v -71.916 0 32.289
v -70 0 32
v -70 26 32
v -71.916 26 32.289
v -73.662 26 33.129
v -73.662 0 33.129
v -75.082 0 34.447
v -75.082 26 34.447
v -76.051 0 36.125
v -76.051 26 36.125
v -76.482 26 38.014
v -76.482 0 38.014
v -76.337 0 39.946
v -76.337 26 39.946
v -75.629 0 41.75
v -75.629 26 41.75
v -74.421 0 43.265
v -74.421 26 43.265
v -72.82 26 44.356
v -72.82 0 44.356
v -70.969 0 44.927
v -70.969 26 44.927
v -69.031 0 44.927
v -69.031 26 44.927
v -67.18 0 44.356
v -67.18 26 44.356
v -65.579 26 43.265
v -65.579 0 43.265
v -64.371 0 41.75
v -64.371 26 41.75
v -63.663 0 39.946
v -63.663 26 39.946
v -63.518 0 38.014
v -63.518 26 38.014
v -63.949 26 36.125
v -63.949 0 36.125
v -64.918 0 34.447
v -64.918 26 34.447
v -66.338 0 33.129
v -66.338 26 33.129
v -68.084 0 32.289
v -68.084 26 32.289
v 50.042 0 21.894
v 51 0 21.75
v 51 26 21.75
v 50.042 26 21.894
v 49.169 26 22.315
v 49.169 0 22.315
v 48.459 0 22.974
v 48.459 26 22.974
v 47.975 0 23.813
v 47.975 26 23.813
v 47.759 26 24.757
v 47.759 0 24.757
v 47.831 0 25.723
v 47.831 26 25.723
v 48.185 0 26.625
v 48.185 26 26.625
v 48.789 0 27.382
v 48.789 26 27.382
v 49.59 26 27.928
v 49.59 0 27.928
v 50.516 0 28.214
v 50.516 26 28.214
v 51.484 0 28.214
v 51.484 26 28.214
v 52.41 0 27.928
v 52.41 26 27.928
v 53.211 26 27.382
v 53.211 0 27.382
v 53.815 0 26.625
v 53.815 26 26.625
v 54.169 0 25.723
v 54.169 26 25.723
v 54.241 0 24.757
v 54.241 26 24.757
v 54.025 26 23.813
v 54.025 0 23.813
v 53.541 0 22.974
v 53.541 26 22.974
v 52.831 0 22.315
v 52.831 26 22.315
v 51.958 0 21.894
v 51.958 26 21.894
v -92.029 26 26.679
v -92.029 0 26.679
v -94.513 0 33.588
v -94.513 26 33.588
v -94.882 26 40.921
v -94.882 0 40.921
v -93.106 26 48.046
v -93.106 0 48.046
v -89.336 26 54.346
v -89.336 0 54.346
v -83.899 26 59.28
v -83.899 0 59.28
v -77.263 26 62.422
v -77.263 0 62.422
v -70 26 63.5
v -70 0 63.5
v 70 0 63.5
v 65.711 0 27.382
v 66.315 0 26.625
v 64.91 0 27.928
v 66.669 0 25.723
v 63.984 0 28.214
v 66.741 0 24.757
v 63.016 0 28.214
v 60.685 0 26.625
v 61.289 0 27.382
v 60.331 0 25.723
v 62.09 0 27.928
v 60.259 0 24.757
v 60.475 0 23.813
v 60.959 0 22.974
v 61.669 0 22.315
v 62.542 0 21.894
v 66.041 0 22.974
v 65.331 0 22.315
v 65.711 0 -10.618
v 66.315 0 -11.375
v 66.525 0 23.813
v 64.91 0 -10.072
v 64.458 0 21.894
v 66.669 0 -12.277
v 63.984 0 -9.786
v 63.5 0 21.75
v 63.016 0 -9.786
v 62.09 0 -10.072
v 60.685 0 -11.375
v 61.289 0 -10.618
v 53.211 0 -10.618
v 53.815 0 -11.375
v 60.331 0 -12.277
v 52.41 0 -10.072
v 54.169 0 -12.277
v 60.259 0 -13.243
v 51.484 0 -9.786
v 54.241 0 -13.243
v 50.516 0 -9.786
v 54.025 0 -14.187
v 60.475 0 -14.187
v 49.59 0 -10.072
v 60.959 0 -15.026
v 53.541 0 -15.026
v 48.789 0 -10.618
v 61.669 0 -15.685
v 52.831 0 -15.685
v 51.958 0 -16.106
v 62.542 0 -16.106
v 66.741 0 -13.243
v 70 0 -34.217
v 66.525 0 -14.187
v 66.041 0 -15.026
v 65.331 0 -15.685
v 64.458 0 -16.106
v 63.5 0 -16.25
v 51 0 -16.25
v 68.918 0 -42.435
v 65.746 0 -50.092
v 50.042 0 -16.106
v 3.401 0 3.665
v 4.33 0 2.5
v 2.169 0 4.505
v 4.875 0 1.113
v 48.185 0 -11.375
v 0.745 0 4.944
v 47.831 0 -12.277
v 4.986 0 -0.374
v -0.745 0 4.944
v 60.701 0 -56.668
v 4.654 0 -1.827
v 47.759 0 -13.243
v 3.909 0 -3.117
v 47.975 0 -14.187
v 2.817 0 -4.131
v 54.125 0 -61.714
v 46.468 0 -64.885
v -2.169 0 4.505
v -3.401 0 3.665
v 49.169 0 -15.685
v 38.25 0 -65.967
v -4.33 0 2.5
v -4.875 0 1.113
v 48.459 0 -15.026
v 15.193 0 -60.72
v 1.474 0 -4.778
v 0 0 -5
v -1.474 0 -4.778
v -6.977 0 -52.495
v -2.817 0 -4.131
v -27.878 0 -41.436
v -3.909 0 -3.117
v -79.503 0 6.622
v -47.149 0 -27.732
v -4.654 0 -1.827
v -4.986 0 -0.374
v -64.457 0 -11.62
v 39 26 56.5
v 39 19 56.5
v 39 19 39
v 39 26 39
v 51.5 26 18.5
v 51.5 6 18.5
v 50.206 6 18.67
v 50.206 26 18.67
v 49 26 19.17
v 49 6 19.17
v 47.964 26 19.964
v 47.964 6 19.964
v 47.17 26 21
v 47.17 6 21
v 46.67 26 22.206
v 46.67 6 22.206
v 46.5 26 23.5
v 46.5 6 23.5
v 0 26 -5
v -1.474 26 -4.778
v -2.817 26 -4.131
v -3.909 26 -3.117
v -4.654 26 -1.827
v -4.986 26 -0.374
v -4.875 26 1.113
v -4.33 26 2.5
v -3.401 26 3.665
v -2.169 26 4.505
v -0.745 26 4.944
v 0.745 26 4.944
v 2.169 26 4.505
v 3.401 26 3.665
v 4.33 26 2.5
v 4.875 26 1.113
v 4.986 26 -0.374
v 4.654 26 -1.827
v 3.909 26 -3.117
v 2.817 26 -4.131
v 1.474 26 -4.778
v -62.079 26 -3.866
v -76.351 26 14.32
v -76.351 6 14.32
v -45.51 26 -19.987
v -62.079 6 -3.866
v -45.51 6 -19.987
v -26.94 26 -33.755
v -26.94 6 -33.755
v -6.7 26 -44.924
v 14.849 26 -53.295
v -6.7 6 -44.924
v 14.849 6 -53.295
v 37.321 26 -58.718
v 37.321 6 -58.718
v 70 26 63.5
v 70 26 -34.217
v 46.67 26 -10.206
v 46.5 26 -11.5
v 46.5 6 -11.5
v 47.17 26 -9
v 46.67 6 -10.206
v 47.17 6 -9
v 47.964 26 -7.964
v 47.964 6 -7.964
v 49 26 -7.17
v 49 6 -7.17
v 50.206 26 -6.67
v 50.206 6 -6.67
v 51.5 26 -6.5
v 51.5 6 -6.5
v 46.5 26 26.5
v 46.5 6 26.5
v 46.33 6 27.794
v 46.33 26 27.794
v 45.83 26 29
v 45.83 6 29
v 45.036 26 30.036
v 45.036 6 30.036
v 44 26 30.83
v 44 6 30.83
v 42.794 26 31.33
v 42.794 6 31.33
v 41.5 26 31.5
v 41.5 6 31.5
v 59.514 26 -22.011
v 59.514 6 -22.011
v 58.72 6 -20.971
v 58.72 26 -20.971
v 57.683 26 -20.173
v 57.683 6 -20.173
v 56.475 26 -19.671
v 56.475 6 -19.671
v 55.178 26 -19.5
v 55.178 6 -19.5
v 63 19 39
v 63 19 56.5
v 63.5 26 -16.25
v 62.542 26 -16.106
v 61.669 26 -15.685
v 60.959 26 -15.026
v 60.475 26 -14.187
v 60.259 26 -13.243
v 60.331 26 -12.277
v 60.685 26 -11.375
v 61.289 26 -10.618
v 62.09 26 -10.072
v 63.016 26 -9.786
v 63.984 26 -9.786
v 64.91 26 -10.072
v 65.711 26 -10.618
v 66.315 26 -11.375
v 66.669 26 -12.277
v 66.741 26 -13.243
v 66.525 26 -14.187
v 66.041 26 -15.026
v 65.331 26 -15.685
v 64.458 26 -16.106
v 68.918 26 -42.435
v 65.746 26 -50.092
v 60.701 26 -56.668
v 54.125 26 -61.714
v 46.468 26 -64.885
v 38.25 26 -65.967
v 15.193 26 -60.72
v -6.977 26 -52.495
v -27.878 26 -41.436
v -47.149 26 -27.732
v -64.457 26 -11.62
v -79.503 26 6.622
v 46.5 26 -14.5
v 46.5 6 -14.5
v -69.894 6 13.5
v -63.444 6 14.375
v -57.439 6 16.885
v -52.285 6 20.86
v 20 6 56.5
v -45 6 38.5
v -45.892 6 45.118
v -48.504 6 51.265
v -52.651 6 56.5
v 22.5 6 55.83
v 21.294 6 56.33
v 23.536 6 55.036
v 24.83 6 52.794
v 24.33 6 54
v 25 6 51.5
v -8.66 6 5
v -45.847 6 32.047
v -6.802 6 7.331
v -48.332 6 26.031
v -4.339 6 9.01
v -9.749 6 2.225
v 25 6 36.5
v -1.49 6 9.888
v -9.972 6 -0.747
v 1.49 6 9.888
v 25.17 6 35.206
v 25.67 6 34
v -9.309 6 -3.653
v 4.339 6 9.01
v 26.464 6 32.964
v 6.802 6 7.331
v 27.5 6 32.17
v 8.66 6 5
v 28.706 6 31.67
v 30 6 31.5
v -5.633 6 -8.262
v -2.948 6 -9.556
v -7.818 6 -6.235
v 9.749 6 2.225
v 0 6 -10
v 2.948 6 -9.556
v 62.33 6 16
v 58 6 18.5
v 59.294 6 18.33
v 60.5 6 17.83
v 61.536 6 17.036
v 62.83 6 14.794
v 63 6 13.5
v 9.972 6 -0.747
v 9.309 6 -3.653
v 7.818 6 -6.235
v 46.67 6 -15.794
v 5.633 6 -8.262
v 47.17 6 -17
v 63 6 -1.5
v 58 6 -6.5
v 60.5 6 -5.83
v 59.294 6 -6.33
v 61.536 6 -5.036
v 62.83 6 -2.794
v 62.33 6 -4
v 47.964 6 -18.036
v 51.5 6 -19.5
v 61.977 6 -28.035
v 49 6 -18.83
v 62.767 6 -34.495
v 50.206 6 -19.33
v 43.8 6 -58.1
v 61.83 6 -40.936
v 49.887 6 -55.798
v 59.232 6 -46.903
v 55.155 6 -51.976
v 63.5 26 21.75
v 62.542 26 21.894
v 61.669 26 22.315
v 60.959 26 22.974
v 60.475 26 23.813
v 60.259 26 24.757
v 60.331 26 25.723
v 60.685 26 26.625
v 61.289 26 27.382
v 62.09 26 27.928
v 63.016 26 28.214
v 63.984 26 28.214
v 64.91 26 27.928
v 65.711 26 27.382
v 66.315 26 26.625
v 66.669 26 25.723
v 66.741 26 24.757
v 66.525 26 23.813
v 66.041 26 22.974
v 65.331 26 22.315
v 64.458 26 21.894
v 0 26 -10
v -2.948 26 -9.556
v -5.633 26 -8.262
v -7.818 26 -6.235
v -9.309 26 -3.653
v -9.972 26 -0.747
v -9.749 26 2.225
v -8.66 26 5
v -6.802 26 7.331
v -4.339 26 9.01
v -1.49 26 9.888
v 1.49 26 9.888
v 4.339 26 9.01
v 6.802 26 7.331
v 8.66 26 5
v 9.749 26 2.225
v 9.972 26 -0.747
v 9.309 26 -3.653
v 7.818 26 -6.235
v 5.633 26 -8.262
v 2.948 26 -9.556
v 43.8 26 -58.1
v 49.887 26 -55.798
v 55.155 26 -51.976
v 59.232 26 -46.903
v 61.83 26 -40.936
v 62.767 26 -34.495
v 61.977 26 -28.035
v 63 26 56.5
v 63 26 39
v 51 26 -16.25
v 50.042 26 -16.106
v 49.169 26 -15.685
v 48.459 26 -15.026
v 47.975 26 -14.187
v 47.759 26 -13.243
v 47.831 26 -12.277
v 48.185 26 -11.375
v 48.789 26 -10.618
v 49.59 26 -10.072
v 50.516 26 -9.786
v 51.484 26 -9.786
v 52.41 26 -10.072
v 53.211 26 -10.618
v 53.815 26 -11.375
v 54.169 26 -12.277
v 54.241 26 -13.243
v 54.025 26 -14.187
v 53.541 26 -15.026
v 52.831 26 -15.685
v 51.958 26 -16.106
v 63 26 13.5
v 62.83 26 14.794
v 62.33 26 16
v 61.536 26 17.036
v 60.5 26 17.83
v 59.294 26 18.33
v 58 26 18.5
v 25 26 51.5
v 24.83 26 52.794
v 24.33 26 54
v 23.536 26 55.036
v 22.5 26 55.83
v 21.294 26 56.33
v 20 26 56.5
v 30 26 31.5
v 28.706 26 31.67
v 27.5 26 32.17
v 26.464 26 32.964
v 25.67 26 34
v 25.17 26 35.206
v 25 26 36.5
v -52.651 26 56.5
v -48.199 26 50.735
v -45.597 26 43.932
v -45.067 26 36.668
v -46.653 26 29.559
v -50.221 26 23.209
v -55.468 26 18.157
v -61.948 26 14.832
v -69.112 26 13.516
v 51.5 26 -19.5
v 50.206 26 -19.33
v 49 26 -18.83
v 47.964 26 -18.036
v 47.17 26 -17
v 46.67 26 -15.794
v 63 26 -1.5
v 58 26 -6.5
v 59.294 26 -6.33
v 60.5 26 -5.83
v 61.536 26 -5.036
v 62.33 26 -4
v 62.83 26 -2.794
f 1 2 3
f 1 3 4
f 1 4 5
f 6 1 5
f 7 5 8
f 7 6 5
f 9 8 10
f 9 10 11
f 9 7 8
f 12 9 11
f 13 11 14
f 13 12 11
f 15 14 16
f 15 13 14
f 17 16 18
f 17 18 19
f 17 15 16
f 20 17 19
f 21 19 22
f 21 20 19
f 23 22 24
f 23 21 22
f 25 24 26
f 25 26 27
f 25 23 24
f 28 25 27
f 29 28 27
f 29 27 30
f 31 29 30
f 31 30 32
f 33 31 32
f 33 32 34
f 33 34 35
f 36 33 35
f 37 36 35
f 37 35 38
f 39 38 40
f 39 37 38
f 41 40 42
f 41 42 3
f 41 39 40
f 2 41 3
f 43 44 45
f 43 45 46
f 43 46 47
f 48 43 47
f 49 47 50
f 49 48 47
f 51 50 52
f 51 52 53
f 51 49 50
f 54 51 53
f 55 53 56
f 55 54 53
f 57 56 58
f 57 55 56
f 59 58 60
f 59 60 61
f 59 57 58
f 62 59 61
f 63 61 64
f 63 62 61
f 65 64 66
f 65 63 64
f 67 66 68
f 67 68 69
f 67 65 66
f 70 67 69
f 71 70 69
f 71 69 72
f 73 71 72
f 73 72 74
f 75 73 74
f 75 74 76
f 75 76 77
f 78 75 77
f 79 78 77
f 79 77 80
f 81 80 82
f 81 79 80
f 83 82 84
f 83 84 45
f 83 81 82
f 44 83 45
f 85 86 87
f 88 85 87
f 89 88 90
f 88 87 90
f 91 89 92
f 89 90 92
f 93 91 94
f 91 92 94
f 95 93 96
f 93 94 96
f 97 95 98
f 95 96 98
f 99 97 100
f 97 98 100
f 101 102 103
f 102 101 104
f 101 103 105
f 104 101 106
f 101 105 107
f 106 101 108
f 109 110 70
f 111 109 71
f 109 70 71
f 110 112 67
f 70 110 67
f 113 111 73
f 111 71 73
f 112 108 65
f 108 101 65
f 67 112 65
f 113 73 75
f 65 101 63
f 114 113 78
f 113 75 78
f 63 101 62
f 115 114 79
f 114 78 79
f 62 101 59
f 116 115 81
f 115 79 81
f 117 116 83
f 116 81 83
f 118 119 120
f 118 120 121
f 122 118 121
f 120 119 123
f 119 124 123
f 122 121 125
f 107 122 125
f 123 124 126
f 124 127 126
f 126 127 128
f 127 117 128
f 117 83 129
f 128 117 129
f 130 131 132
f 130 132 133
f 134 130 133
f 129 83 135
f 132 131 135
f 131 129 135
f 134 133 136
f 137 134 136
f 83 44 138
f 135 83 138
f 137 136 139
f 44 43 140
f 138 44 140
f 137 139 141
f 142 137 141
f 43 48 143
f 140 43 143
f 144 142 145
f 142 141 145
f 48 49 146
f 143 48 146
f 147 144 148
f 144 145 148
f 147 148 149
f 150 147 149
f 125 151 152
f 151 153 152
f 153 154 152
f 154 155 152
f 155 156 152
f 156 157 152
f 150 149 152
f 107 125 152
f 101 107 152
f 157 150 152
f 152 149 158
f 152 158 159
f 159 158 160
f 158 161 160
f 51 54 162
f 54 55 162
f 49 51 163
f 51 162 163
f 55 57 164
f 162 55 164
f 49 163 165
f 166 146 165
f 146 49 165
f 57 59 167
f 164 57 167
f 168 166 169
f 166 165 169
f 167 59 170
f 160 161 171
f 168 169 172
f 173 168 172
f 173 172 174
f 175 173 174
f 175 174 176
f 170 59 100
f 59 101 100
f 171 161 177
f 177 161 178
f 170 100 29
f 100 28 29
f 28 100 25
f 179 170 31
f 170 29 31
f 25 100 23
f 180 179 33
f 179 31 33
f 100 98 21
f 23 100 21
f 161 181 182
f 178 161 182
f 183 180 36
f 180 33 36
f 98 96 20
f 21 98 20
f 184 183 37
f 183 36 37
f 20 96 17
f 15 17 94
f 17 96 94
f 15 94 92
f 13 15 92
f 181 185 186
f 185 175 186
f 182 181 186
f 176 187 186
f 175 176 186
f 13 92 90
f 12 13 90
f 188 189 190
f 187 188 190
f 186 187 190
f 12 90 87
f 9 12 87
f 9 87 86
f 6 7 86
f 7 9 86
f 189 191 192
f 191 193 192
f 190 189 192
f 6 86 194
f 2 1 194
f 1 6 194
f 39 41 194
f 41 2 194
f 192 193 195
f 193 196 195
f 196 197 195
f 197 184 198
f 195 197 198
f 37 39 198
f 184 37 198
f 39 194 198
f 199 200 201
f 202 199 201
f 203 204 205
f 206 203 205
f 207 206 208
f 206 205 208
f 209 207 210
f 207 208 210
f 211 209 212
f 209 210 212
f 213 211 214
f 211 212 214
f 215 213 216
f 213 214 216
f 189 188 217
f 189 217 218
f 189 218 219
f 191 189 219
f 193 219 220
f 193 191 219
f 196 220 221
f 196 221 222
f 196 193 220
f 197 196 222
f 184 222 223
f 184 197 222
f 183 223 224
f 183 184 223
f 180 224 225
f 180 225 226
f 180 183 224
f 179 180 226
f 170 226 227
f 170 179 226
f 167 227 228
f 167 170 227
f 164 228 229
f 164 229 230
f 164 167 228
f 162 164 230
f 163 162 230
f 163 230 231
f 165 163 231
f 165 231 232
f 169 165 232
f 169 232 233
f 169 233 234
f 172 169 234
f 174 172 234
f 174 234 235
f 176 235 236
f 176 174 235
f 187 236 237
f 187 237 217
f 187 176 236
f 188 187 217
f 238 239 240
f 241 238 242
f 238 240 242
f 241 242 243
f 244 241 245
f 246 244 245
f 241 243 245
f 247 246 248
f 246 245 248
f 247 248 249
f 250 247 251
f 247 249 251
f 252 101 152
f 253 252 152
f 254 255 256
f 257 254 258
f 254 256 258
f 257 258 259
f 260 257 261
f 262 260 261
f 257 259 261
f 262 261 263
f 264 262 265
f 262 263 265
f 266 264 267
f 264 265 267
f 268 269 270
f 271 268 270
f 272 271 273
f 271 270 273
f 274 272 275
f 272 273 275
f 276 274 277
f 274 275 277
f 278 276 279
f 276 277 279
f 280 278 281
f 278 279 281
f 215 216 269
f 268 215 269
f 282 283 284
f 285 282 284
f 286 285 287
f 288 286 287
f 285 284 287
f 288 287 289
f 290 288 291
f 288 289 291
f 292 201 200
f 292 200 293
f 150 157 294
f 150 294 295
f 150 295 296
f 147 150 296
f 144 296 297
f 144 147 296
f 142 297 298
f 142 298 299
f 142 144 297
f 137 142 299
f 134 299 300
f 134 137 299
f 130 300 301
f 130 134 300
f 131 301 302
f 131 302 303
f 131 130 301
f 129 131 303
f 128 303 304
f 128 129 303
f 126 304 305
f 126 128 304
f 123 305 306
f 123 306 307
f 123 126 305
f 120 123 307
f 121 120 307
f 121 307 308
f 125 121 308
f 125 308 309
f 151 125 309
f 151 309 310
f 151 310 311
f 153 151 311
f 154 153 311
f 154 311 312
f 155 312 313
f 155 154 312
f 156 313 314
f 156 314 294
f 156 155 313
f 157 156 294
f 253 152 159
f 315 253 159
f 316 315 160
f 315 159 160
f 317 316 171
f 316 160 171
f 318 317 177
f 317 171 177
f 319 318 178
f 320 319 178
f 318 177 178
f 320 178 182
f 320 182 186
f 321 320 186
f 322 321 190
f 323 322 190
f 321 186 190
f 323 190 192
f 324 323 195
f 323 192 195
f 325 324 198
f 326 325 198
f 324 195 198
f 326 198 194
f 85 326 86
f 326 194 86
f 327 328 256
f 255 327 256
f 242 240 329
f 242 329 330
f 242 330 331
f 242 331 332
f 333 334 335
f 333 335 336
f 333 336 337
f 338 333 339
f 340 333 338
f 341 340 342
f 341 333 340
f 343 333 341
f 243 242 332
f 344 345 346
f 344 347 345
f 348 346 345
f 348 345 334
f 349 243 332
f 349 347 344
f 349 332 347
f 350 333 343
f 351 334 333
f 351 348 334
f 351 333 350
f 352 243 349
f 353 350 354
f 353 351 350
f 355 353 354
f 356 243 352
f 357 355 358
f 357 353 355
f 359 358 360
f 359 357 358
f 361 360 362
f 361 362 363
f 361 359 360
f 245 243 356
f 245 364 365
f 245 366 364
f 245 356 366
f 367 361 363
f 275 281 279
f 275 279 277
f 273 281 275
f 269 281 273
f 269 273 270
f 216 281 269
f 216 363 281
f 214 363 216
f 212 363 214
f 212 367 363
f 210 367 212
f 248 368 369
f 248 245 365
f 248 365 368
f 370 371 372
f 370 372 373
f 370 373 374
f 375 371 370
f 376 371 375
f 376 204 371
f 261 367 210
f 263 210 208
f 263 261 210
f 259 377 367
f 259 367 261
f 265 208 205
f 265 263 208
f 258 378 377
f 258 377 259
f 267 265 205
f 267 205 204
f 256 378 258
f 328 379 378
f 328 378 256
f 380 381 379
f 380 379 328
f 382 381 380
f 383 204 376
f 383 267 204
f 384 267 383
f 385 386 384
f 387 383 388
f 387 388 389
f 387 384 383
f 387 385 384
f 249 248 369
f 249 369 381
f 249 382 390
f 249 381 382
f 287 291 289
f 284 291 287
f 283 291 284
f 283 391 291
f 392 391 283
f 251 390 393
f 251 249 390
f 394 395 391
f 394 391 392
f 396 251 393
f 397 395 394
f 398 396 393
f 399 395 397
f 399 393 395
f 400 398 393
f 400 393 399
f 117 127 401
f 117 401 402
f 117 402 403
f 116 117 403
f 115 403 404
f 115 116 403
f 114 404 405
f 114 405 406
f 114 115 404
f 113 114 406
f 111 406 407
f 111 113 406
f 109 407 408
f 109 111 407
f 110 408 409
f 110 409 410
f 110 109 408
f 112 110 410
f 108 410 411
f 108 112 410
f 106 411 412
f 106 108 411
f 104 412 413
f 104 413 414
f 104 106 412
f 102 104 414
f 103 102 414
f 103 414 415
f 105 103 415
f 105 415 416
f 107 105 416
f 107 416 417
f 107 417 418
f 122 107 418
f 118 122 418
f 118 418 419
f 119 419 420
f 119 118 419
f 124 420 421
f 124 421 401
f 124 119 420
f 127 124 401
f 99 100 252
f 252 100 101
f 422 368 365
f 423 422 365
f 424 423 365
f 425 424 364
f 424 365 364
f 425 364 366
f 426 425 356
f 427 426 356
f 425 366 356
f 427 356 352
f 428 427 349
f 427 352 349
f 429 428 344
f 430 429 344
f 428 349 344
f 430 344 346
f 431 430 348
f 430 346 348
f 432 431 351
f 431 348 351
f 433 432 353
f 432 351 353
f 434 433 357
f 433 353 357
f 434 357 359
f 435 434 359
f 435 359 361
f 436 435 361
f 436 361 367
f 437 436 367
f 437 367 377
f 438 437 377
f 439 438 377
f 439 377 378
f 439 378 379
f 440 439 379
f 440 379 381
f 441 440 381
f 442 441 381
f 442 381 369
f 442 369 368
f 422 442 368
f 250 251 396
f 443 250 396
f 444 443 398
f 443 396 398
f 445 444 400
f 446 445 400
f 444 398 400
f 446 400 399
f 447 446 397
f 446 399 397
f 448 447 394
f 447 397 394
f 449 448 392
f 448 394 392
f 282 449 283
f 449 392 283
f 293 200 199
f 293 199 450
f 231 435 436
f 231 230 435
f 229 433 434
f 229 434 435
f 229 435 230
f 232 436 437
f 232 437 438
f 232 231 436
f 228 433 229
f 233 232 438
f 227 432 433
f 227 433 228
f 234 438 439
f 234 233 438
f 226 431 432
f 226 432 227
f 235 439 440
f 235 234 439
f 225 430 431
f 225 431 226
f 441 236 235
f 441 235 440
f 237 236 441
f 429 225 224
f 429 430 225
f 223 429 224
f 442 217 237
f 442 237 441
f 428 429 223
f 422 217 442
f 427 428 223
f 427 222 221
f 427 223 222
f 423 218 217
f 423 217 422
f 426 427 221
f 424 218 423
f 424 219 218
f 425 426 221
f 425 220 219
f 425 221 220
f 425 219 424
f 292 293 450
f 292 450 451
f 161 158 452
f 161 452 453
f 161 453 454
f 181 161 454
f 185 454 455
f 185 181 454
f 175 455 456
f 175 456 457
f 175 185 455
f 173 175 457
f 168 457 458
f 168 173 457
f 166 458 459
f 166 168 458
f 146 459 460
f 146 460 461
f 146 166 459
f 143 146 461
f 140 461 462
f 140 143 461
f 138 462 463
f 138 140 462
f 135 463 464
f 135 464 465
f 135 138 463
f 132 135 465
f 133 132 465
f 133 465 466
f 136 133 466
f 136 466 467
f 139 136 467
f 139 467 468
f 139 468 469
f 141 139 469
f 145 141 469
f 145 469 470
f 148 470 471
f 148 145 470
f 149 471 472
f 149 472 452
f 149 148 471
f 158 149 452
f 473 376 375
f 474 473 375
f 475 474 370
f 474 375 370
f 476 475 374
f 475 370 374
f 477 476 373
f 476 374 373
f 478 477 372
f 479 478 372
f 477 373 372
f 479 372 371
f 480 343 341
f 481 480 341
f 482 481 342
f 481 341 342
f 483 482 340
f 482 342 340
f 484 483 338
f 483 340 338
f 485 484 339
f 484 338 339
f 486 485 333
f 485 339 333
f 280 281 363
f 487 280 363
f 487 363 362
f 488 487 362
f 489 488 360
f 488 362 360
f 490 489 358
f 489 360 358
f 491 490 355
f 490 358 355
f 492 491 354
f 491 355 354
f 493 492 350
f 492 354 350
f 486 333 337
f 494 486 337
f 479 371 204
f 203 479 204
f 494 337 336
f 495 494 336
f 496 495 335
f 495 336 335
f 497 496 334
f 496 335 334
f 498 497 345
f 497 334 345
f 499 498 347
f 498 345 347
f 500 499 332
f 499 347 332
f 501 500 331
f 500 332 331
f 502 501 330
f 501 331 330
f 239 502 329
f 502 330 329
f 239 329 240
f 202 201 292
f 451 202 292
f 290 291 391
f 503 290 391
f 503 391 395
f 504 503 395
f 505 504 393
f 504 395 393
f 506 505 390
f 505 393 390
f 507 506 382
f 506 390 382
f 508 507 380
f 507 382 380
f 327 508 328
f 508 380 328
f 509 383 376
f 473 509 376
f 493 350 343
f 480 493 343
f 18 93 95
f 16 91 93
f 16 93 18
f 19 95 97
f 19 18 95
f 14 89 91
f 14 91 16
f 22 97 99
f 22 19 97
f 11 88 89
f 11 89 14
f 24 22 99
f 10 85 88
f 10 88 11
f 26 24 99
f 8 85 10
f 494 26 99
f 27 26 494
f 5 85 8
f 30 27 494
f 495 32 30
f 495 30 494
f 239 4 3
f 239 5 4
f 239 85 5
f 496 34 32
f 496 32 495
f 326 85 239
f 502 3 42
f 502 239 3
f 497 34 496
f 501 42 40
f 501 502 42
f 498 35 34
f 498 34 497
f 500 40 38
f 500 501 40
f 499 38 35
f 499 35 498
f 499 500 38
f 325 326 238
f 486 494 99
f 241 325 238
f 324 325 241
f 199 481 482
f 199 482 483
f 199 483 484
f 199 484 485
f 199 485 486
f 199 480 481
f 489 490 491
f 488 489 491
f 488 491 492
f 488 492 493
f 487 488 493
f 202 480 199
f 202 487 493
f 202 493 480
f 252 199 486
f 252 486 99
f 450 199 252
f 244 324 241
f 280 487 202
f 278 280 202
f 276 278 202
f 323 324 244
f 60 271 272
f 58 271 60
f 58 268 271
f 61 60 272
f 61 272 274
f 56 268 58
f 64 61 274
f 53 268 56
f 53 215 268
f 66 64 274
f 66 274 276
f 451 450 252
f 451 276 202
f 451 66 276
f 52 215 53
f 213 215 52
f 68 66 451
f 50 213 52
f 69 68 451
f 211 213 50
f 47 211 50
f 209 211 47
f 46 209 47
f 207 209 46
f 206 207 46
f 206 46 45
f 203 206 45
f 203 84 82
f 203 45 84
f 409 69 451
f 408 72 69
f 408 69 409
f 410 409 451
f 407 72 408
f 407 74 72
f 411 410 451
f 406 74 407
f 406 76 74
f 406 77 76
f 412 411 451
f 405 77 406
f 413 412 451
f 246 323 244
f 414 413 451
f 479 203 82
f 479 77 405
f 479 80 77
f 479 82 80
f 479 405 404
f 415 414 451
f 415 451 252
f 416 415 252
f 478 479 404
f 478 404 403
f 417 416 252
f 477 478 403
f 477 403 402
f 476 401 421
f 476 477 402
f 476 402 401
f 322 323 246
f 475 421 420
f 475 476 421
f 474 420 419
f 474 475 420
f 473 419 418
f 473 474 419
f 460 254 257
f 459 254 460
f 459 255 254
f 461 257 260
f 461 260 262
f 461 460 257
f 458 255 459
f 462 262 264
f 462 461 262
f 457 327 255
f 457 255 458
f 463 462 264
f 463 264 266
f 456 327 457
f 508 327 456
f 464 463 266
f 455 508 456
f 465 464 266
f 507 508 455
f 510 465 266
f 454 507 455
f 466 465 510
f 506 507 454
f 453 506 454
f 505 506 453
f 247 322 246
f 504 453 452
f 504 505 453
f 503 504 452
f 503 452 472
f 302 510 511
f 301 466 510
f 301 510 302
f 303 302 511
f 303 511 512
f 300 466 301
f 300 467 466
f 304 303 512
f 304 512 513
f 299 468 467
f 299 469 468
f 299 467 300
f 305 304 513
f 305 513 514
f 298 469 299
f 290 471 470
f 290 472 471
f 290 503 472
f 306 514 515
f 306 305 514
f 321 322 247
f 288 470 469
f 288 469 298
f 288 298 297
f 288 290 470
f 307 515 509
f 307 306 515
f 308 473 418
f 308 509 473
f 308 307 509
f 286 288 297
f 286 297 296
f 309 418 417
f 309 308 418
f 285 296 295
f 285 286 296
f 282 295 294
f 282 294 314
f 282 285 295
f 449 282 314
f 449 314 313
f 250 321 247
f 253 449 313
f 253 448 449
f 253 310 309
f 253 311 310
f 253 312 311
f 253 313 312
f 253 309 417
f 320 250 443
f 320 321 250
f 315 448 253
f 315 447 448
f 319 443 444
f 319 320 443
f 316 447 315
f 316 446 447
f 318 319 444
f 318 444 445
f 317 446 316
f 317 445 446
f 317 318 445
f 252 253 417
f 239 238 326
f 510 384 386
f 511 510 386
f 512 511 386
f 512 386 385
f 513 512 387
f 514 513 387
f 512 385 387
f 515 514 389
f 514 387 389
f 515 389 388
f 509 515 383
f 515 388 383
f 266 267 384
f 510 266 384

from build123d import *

# Parameters (mm, degrees)
SKETCH1_W           = 24
SKETCH1_H           = 17.5
SKETCH1_R           = 3.249999996
SKETCH1_R_2         = 3.25
SKETCH1_R_3         = 6.5
BOSS_EXTRUDE1_DEPTH = 26
SKETCH1_3_R         = 10
BOSS_EXTRUDE2_DEPTH = 6
SKETCH1_4_W         = 24
SKETCH1_4_H         = 17.5
BOSS_EXTRUDE3_DEPTH = 19
SKETCH1_5_R         = 10
SKETCH1_5_R_2       = 5
BOSS_EXTRUDE4_DEPTH = 26


with BuildPart() as part:
    # Sketch1 → Boss-Extrude1 (new body)
    with BuildSketch(Plane(origin=(0, 0, 0), x_dir=(1, 0, 0), z_dir=(0, 1, 0))):
        with BuildLine():
            ThreePointArc((38.25, 65.967283386), (-37.738740481, 34.900395081), (-92.028760258, -26.679098109))
            ThreePointArc((-92.028760258, -26.679098109), (-91.453700698, -51.335058487), (-70, -63.5))
            Line((-70, -63.5), (70, -63.5))
            Line((70, -63.5), (70, 34.217283386))
            ThreePointArc((70, 34.217283386), (60.700640303, 56.667923689), (38.25, 65.967283386))
        make_face()
        with BuildLine():
            Line((20, -56.5), (-52.650648427, -56.5))
            ThreePointArc((-52.650648427, -56.5), (-48.204829606, -26.253753738), (-76.350661821, -14.320068353))
            ThreePointArc((-76.350661821, -14.320068353), (-26.940104532, 33.755265523), (37.320914143, 58.718486024))
            ThreePointArc((37.320914143, 58.718486024), (59.232009713, 46.90299975), (59.514375282, 22.010790233))
            ThreePointArc((59.514375282, 22.010790233), (57.683425726, 20.172988974), (55.178036419, 19.5))
            Line((55.178036419, 19.5), (51.5, 19.5))
            ThreePointArc((51.5, 19.5), (47.964466094, 18.035533906), (46.5, 14.5))
            Line((46.5, 14.5), (46.5, 11.5))
            ThreePointArc((46.5, 11.5), (47.964466094, 7.964466094), (51.5, 6.5))
            Line((51.5, 6.5), (58, 6.5))
            ThreePointArc((58, 6.5), (61.535533906, 5.035533906), (63, 1.5))
            Line((63, 1.5), (63, -13.5))
            ThreePointArc((63, -13.5), (61.535533906, -17.035533906), (58, -18.5))
            Line((58, -18.5), (51.5, -18.5))
            ThreePointArc((51.5, -18.5), (47.964466094, -19.964466094), (46.5, -23.5))
            Line((46.5, -23.5), (46.5, -26.5))
            ThreePointArc((46.5, -26.5), (45.035533906, -30.035533906), (41.5, -31.5))
            Line((41.5, -31.5), (30, -31.5))
            ThreePointArc((30, -31.5), (26.464466094, -32.964466094), (25, -36.5))
            Line((25, -36.5), (25, -51.5))
            ThreePointArc((25, -51.5), (23.535533906, -55.035533906), (20, -56.5))
        make_face(mode=Mode.SUBTRACT)
        with Locations((51, -47.75)):
            Rectangle(SKETCH1_W, SKETCH1_H, mode=Mode.SUBTRACT)
        with Locations((51, -25)):
            Circle(SKETCH1_R, mode=Mode.SUBTRACT)
        with Locations((63.5, -25)):
            Circle(SKETCH1_R_2, mode=Mode.SUBTRACT)
        with Locations((51, 13)):
            Circle(SKETCH1_R, mode=Mode.SUBTRACT)
        with Locations((63.5, 13)):
            Circle(SKETCH1_R_2, mode=Mode.SUBTRACT)
        with Locations((-70, -38.5)):
            Circle(SKETCH1_R_3, mode=Mode.SUBTRACT)
    extrude(amount=BOSS_EXTRUDE1_DEPTH)

    # Sketch1<3> → Boss-Extrude2 (add)
    with BuildSketch(Plane(origin=(0, 0, 0), x_dir=(1, 0, 0), z_dir=(0, 1, 0))):
        with BuildLine():
            ThreePointArc((-45, -38.5), (-46.992025412, -48.279218033), (-52.650648427, -56.5))
            Line((-52.650648427, -56.5), (20, -56.5))
            ThreePointArc((20, -56.5), (23.535533906, -55.035533906), (25, -51.5))
            Line((25, -51.5), (25, -36.5))
            ThreePointArc((25, -36.5), (26.464466094, -32.964466094), (30, -31.5))
            Line((30, -31.5), (41.5, -31.5))
            ThreePointArc((41.5, -31.5), (45.035533906, -30.035533906), (46.5, -26.5))
            Line((46.5, -26.5), (46.5, -23.5))
            ThreePointArc((46.5, -23.5), (47.964466094, -19.964466094), (51.5, -18.5))
            Line((51.5, -18.5), (58, -18.5))
            ThreePointArc((58, -18.5), (61.535533906, -17.035533906), (63, -13.5))
            Line((63, -13.5), (63, 1.5))
            ThreePointArc((63, 1.5), (61.535533906, 5.035533906), (58, 6.5))
            Line((58, 6.5), (51.5, 6.5))
            ThreePointArc((51.5, 6.5), (47.964466094, 7.964466094), (46.5, 11.5))
            Line((46.5, 11.5), (46.5, 14.5))
            ThreePointArc((46.5, 14.5), (47.964466094, 18.035533906), (51.5, 19.5))
            Line((51.5, 19.5), (55.178036419, 19.5))
            ThreePointArc((55.178036419, 19.5), (57.683425726, 20.172988974), (59.514375282, 22.010790233))
            ThreePointArc((59.514375282, 22.010790233), (59.232009713, 46.90299975), (37.320914143, 58.718486024))
            ThreePointArc((37.320914143, 58.718486024), (-26.940104532, 33.755265523), (-76.350661821, -14.320068353))
            ThreePointArc((-76.350661821, -14.320068353), (-54.731839428, -18.703958154), (-45, -38.5))
        make_face()
        Circle(SKETCH1_3_R, mode=Mode.SUBTRACT)
    extrude(amount=BOSS_EXTRUDE2_DEPTH)

    # Sketch1<4> → Boss-Extrude3 (add)
    with BuildSketch(Plane(origin=(0, 0, 0), x_dir=(1, 0, 0), z_dir=(0, 1, 0))):
        with Locations((51, -47.75)):
            Rectangle(SKETCH1_4_W, SKETCH1_4_H)
    extrude(amount=BOSS_EXTRUDE3_DEPTH)

    # Sketch1<5> → Boss-Extrude4 (add)
    with BuildSketch(Plane(origin=(0, 0, 0), x_dir=(1, 0, 0), z_dir=(0, 1, 0))):
        Circle(SKETCH1_5_R)
        Circle(SKETCH1_5_R_2, mode=Mode.SUBTRACT)
    extrude(amount=BOSS_EXTRUDE4_DEPTH)


solid = part.part
